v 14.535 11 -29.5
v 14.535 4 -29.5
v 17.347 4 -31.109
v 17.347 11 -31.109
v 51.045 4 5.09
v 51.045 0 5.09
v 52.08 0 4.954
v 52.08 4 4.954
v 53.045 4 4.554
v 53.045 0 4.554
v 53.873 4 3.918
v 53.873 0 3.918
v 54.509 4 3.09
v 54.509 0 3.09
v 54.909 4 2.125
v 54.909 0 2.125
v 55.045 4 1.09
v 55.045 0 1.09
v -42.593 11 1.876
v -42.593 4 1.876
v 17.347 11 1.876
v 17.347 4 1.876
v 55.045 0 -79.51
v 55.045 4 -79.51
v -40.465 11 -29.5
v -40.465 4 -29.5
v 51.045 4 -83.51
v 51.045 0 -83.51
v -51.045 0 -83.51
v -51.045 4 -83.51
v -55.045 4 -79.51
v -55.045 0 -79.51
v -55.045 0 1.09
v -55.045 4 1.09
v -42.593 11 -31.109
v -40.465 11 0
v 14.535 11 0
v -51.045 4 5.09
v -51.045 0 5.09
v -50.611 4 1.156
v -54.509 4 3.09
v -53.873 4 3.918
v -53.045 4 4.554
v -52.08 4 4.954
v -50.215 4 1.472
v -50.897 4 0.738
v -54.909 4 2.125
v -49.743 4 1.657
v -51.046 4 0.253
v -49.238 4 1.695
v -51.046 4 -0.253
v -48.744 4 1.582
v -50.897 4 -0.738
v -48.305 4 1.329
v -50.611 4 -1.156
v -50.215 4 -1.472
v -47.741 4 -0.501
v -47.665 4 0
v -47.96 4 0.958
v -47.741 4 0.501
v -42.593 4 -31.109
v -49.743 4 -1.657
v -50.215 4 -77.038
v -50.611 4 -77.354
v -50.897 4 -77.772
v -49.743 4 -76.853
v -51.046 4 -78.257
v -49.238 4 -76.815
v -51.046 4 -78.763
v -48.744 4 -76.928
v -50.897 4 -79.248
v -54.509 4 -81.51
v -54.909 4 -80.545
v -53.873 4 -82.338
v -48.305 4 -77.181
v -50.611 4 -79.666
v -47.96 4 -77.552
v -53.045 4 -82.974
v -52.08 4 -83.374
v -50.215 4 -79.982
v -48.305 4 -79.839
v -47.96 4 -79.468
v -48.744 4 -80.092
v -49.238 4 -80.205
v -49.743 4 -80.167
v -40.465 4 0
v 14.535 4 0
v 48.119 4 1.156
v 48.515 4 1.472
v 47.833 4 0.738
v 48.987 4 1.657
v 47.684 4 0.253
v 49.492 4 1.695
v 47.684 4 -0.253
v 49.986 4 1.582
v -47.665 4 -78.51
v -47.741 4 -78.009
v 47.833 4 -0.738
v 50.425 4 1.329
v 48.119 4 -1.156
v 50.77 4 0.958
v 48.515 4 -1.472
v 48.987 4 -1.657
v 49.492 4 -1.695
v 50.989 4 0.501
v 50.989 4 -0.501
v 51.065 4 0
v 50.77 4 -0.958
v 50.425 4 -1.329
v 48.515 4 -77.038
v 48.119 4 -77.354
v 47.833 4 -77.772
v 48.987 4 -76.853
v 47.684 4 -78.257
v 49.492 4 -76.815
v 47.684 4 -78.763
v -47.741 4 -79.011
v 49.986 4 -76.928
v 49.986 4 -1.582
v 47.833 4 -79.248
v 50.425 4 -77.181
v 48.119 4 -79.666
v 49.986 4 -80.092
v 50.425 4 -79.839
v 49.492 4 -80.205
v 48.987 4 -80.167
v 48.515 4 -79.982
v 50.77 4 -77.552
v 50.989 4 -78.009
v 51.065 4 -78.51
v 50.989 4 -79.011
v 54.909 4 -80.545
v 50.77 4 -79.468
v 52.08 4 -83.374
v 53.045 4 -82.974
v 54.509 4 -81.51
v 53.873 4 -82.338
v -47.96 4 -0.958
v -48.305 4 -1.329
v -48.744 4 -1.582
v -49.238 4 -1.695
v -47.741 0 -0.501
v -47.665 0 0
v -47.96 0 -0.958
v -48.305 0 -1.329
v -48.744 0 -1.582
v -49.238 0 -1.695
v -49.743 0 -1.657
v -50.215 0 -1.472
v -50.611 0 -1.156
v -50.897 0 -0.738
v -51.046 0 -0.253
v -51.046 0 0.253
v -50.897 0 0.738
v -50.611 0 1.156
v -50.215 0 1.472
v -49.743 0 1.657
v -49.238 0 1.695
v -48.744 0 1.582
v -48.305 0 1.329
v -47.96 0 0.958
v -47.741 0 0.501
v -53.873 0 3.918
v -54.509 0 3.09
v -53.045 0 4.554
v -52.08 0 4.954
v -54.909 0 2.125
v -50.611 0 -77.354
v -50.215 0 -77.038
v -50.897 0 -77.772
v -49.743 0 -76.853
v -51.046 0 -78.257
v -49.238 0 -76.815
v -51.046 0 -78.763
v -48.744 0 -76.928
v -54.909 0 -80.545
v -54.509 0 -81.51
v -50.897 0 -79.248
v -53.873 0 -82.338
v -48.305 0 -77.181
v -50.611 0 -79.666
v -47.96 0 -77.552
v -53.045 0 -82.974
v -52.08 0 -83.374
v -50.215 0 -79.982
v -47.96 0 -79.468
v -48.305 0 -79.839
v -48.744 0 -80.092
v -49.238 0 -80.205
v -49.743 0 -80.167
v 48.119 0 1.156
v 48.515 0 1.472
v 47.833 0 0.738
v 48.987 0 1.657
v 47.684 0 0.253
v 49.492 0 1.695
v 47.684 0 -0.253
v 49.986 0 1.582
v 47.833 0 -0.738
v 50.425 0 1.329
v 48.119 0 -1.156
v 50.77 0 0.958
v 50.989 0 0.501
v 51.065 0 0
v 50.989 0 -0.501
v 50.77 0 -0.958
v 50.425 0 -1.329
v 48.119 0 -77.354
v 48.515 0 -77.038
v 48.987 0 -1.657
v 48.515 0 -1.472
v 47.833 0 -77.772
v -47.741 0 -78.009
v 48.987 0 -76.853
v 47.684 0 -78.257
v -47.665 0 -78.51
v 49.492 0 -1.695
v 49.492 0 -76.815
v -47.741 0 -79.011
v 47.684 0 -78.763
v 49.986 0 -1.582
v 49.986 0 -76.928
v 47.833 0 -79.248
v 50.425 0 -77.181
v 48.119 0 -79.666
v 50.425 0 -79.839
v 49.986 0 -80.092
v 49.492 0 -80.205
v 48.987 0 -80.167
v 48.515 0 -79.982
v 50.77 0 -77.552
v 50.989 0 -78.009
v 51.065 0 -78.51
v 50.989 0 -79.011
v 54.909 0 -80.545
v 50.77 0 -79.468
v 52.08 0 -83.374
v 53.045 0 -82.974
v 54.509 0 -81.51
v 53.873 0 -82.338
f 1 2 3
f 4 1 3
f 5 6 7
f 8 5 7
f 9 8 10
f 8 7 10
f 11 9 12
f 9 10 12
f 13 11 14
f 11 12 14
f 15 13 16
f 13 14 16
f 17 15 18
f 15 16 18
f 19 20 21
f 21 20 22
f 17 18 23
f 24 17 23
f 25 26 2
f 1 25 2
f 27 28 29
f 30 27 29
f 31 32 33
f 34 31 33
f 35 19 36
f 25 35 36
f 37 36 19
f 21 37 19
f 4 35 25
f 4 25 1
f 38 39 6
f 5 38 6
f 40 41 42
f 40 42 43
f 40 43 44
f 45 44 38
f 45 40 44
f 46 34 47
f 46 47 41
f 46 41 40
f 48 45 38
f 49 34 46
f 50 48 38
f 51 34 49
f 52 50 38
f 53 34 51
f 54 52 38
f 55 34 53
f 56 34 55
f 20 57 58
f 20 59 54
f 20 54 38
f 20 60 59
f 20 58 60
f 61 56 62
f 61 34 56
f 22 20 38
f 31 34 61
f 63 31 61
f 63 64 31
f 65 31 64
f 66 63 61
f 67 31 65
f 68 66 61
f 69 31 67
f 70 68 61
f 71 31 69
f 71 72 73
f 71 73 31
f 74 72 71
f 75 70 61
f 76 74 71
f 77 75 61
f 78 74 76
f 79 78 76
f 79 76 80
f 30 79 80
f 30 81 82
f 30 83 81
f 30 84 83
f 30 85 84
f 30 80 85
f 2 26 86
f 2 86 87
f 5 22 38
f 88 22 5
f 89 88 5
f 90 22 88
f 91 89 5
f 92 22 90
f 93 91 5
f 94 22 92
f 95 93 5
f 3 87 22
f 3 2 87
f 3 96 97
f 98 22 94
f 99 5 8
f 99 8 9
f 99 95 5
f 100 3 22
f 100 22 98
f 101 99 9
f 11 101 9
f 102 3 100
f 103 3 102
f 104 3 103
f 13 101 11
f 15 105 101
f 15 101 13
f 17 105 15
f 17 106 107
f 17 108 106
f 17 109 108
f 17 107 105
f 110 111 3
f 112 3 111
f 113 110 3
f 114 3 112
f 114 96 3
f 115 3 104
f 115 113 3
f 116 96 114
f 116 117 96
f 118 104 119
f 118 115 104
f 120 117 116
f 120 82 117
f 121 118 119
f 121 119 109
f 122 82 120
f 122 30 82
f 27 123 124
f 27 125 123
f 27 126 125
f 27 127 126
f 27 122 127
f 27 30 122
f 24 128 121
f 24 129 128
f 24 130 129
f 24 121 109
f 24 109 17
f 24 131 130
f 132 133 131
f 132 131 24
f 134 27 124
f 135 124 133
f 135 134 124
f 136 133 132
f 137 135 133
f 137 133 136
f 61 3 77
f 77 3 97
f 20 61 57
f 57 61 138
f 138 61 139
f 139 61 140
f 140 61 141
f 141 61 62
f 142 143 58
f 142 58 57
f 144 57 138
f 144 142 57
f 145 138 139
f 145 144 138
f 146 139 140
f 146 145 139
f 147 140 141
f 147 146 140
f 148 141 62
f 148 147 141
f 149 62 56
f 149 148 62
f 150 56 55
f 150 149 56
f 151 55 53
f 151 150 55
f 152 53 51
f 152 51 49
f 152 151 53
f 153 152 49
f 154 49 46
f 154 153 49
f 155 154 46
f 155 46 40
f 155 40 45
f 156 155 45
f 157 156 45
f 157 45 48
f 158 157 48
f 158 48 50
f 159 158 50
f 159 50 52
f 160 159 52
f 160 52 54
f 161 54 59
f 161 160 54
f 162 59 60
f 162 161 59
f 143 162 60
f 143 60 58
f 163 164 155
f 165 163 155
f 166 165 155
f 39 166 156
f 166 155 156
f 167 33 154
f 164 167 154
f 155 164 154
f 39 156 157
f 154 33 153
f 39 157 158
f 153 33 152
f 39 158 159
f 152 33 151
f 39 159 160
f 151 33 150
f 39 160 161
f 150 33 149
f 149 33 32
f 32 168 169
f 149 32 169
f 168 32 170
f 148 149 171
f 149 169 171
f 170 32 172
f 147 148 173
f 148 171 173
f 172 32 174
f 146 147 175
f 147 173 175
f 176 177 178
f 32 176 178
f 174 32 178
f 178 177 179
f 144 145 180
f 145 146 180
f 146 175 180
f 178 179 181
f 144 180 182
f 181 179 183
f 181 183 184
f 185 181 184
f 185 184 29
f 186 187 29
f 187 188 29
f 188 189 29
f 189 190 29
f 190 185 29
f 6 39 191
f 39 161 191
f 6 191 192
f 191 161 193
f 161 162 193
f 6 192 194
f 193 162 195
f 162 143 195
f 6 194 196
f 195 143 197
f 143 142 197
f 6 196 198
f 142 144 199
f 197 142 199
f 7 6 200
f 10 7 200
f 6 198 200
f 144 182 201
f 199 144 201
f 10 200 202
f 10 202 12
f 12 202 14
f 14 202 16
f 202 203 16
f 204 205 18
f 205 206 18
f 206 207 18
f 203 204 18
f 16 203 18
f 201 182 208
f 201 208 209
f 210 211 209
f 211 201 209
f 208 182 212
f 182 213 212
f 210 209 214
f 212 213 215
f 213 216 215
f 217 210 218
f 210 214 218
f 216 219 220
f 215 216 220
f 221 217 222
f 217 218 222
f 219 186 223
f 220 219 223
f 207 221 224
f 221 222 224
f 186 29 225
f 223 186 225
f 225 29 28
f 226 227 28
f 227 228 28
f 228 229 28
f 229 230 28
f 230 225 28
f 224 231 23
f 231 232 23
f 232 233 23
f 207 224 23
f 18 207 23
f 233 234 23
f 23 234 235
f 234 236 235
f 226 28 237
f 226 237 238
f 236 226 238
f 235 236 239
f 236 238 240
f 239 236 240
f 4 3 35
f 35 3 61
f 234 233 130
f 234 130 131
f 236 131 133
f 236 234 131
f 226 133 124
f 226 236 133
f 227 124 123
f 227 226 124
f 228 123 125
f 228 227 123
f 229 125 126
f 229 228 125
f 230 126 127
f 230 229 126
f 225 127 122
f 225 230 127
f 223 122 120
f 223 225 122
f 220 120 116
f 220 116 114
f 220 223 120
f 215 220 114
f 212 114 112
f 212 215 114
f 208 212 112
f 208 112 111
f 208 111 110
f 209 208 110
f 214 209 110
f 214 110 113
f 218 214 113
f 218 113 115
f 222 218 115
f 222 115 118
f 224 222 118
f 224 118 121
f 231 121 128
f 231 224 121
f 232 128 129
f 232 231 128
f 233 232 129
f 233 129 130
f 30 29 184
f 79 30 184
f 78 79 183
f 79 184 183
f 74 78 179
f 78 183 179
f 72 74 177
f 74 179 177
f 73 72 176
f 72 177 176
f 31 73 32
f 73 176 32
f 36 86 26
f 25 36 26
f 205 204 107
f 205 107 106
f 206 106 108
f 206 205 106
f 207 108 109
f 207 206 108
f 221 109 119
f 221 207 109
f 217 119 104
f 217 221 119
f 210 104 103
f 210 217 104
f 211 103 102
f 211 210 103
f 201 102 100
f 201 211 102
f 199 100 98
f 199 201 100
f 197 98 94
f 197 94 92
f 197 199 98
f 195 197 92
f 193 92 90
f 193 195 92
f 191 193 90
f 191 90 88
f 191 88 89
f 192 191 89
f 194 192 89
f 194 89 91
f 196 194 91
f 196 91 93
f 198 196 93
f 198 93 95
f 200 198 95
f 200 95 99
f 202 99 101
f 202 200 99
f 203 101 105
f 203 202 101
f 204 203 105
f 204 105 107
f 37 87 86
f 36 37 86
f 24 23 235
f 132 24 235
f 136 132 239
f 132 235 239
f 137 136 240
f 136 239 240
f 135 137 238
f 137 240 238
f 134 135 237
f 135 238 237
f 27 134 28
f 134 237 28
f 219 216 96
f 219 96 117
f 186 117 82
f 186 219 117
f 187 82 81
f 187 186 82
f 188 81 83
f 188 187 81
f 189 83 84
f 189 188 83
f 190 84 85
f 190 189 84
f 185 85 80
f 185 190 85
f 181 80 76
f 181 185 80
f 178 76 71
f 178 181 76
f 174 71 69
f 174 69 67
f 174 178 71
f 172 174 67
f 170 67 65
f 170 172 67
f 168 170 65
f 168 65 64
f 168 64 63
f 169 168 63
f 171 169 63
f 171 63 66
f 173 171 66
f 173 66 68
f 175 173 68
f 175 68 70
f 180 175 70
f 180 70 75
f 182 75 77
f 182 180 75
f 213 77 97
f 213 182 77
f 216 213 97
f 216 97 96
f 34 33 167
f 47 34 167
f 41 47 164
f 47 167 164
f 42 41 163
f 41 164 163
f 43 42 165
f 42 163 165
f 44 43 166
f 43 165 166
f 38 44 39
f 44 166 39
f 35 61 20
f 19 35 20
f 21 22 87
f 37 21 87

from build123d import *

# Parameters (mm, degrees)
BOSS_EXTRUDE1_DEPTH = 11
SKETCH1_3_R         = 1.7
BOSS_EXTRUDE2_DEPTH = 4


with BuildPart() as part:
    # Sketch1 → Boss-Extrude1 (new body)
    with BuildSketch(Plane(origin=(0, 0, 0), x_dir=(1, 0, 0), z_dir=(0, 1, 0))):
        Polygon((14.535232679, 29.5), (17.346594298, 31.108605337), (-42.592792902, 31.108605337), (-42.592792902, -1.87579117), (17.346594298, -1.87579117), (14.535232679, 0), (-40.464767321, 0), (-40.464767321, 29.5), align=None)
    extrude(amount=BOSS_EXTRUDE1_DEPTH)

    # Sketch1<3> → Boss-Extrude2 (add)
    with BuildSketch(Plane(origin=(0, 0, 0), x_dir=(1, 0, 0), z_dir=(0, 1, 0))):
        with BuildLine():
            Line((55.045, -1.09), (55.045, 79.51))
            ThreePointArc((55.045, 79.51), (53.873427125, 82.338427125), (51.045, 83.51))
            Line((51.045, 83.51), (-51.045, 83.51))
            ThreePointArc((-51.045, 83.51), (-53.873427125, 82.338427125), (-55.045, 79.51))
            Line((-55.045, 79.51), (-55.045, -1.09))
            ThreePointArc((-55.045, -1.09), (-53.873427125, -3.918427125), (-51.045, -5.09))
            Line((-51.045, -5.09), (51.045, -5.09))
            ThreePointArc((51.045, -5.09), (53.873427125, -3.918427125), (55.045, -1.09))
        make_face()
        with Locations((-49.365, 0)):
            Circle(SKETCH1_3_R, mode=Mode.SUBTRACT)
        Polygon((17.346594298, 31.108605337), (14.535232679, 29.5), (-40.464767321, 29.5), (-40.464767321, 0), (14.535232679, 0), (17.346594298, -1.87579117), (-42.592792902, -1.87579117), (-42.592792902, 31.108605337), align=None, mode=Mode.SUBTRACT)
        with Locations((49.365, 0)):
            Circle(SKETCH1_3_R, mode=Mode.SUBTRACT)
        with Locations((-49.365, 78.51)):
            Circle(SKETCH1_3_R, mode=Mode.SUBTRACT)
        with Locations((49.365, 78.51)):
            Circle(SKETCH1_3_R, mode=Mode.SUBTRACT)
    extrude(amount=BOSS_EXTRUDE2_DEPTH)


solid = part.part
